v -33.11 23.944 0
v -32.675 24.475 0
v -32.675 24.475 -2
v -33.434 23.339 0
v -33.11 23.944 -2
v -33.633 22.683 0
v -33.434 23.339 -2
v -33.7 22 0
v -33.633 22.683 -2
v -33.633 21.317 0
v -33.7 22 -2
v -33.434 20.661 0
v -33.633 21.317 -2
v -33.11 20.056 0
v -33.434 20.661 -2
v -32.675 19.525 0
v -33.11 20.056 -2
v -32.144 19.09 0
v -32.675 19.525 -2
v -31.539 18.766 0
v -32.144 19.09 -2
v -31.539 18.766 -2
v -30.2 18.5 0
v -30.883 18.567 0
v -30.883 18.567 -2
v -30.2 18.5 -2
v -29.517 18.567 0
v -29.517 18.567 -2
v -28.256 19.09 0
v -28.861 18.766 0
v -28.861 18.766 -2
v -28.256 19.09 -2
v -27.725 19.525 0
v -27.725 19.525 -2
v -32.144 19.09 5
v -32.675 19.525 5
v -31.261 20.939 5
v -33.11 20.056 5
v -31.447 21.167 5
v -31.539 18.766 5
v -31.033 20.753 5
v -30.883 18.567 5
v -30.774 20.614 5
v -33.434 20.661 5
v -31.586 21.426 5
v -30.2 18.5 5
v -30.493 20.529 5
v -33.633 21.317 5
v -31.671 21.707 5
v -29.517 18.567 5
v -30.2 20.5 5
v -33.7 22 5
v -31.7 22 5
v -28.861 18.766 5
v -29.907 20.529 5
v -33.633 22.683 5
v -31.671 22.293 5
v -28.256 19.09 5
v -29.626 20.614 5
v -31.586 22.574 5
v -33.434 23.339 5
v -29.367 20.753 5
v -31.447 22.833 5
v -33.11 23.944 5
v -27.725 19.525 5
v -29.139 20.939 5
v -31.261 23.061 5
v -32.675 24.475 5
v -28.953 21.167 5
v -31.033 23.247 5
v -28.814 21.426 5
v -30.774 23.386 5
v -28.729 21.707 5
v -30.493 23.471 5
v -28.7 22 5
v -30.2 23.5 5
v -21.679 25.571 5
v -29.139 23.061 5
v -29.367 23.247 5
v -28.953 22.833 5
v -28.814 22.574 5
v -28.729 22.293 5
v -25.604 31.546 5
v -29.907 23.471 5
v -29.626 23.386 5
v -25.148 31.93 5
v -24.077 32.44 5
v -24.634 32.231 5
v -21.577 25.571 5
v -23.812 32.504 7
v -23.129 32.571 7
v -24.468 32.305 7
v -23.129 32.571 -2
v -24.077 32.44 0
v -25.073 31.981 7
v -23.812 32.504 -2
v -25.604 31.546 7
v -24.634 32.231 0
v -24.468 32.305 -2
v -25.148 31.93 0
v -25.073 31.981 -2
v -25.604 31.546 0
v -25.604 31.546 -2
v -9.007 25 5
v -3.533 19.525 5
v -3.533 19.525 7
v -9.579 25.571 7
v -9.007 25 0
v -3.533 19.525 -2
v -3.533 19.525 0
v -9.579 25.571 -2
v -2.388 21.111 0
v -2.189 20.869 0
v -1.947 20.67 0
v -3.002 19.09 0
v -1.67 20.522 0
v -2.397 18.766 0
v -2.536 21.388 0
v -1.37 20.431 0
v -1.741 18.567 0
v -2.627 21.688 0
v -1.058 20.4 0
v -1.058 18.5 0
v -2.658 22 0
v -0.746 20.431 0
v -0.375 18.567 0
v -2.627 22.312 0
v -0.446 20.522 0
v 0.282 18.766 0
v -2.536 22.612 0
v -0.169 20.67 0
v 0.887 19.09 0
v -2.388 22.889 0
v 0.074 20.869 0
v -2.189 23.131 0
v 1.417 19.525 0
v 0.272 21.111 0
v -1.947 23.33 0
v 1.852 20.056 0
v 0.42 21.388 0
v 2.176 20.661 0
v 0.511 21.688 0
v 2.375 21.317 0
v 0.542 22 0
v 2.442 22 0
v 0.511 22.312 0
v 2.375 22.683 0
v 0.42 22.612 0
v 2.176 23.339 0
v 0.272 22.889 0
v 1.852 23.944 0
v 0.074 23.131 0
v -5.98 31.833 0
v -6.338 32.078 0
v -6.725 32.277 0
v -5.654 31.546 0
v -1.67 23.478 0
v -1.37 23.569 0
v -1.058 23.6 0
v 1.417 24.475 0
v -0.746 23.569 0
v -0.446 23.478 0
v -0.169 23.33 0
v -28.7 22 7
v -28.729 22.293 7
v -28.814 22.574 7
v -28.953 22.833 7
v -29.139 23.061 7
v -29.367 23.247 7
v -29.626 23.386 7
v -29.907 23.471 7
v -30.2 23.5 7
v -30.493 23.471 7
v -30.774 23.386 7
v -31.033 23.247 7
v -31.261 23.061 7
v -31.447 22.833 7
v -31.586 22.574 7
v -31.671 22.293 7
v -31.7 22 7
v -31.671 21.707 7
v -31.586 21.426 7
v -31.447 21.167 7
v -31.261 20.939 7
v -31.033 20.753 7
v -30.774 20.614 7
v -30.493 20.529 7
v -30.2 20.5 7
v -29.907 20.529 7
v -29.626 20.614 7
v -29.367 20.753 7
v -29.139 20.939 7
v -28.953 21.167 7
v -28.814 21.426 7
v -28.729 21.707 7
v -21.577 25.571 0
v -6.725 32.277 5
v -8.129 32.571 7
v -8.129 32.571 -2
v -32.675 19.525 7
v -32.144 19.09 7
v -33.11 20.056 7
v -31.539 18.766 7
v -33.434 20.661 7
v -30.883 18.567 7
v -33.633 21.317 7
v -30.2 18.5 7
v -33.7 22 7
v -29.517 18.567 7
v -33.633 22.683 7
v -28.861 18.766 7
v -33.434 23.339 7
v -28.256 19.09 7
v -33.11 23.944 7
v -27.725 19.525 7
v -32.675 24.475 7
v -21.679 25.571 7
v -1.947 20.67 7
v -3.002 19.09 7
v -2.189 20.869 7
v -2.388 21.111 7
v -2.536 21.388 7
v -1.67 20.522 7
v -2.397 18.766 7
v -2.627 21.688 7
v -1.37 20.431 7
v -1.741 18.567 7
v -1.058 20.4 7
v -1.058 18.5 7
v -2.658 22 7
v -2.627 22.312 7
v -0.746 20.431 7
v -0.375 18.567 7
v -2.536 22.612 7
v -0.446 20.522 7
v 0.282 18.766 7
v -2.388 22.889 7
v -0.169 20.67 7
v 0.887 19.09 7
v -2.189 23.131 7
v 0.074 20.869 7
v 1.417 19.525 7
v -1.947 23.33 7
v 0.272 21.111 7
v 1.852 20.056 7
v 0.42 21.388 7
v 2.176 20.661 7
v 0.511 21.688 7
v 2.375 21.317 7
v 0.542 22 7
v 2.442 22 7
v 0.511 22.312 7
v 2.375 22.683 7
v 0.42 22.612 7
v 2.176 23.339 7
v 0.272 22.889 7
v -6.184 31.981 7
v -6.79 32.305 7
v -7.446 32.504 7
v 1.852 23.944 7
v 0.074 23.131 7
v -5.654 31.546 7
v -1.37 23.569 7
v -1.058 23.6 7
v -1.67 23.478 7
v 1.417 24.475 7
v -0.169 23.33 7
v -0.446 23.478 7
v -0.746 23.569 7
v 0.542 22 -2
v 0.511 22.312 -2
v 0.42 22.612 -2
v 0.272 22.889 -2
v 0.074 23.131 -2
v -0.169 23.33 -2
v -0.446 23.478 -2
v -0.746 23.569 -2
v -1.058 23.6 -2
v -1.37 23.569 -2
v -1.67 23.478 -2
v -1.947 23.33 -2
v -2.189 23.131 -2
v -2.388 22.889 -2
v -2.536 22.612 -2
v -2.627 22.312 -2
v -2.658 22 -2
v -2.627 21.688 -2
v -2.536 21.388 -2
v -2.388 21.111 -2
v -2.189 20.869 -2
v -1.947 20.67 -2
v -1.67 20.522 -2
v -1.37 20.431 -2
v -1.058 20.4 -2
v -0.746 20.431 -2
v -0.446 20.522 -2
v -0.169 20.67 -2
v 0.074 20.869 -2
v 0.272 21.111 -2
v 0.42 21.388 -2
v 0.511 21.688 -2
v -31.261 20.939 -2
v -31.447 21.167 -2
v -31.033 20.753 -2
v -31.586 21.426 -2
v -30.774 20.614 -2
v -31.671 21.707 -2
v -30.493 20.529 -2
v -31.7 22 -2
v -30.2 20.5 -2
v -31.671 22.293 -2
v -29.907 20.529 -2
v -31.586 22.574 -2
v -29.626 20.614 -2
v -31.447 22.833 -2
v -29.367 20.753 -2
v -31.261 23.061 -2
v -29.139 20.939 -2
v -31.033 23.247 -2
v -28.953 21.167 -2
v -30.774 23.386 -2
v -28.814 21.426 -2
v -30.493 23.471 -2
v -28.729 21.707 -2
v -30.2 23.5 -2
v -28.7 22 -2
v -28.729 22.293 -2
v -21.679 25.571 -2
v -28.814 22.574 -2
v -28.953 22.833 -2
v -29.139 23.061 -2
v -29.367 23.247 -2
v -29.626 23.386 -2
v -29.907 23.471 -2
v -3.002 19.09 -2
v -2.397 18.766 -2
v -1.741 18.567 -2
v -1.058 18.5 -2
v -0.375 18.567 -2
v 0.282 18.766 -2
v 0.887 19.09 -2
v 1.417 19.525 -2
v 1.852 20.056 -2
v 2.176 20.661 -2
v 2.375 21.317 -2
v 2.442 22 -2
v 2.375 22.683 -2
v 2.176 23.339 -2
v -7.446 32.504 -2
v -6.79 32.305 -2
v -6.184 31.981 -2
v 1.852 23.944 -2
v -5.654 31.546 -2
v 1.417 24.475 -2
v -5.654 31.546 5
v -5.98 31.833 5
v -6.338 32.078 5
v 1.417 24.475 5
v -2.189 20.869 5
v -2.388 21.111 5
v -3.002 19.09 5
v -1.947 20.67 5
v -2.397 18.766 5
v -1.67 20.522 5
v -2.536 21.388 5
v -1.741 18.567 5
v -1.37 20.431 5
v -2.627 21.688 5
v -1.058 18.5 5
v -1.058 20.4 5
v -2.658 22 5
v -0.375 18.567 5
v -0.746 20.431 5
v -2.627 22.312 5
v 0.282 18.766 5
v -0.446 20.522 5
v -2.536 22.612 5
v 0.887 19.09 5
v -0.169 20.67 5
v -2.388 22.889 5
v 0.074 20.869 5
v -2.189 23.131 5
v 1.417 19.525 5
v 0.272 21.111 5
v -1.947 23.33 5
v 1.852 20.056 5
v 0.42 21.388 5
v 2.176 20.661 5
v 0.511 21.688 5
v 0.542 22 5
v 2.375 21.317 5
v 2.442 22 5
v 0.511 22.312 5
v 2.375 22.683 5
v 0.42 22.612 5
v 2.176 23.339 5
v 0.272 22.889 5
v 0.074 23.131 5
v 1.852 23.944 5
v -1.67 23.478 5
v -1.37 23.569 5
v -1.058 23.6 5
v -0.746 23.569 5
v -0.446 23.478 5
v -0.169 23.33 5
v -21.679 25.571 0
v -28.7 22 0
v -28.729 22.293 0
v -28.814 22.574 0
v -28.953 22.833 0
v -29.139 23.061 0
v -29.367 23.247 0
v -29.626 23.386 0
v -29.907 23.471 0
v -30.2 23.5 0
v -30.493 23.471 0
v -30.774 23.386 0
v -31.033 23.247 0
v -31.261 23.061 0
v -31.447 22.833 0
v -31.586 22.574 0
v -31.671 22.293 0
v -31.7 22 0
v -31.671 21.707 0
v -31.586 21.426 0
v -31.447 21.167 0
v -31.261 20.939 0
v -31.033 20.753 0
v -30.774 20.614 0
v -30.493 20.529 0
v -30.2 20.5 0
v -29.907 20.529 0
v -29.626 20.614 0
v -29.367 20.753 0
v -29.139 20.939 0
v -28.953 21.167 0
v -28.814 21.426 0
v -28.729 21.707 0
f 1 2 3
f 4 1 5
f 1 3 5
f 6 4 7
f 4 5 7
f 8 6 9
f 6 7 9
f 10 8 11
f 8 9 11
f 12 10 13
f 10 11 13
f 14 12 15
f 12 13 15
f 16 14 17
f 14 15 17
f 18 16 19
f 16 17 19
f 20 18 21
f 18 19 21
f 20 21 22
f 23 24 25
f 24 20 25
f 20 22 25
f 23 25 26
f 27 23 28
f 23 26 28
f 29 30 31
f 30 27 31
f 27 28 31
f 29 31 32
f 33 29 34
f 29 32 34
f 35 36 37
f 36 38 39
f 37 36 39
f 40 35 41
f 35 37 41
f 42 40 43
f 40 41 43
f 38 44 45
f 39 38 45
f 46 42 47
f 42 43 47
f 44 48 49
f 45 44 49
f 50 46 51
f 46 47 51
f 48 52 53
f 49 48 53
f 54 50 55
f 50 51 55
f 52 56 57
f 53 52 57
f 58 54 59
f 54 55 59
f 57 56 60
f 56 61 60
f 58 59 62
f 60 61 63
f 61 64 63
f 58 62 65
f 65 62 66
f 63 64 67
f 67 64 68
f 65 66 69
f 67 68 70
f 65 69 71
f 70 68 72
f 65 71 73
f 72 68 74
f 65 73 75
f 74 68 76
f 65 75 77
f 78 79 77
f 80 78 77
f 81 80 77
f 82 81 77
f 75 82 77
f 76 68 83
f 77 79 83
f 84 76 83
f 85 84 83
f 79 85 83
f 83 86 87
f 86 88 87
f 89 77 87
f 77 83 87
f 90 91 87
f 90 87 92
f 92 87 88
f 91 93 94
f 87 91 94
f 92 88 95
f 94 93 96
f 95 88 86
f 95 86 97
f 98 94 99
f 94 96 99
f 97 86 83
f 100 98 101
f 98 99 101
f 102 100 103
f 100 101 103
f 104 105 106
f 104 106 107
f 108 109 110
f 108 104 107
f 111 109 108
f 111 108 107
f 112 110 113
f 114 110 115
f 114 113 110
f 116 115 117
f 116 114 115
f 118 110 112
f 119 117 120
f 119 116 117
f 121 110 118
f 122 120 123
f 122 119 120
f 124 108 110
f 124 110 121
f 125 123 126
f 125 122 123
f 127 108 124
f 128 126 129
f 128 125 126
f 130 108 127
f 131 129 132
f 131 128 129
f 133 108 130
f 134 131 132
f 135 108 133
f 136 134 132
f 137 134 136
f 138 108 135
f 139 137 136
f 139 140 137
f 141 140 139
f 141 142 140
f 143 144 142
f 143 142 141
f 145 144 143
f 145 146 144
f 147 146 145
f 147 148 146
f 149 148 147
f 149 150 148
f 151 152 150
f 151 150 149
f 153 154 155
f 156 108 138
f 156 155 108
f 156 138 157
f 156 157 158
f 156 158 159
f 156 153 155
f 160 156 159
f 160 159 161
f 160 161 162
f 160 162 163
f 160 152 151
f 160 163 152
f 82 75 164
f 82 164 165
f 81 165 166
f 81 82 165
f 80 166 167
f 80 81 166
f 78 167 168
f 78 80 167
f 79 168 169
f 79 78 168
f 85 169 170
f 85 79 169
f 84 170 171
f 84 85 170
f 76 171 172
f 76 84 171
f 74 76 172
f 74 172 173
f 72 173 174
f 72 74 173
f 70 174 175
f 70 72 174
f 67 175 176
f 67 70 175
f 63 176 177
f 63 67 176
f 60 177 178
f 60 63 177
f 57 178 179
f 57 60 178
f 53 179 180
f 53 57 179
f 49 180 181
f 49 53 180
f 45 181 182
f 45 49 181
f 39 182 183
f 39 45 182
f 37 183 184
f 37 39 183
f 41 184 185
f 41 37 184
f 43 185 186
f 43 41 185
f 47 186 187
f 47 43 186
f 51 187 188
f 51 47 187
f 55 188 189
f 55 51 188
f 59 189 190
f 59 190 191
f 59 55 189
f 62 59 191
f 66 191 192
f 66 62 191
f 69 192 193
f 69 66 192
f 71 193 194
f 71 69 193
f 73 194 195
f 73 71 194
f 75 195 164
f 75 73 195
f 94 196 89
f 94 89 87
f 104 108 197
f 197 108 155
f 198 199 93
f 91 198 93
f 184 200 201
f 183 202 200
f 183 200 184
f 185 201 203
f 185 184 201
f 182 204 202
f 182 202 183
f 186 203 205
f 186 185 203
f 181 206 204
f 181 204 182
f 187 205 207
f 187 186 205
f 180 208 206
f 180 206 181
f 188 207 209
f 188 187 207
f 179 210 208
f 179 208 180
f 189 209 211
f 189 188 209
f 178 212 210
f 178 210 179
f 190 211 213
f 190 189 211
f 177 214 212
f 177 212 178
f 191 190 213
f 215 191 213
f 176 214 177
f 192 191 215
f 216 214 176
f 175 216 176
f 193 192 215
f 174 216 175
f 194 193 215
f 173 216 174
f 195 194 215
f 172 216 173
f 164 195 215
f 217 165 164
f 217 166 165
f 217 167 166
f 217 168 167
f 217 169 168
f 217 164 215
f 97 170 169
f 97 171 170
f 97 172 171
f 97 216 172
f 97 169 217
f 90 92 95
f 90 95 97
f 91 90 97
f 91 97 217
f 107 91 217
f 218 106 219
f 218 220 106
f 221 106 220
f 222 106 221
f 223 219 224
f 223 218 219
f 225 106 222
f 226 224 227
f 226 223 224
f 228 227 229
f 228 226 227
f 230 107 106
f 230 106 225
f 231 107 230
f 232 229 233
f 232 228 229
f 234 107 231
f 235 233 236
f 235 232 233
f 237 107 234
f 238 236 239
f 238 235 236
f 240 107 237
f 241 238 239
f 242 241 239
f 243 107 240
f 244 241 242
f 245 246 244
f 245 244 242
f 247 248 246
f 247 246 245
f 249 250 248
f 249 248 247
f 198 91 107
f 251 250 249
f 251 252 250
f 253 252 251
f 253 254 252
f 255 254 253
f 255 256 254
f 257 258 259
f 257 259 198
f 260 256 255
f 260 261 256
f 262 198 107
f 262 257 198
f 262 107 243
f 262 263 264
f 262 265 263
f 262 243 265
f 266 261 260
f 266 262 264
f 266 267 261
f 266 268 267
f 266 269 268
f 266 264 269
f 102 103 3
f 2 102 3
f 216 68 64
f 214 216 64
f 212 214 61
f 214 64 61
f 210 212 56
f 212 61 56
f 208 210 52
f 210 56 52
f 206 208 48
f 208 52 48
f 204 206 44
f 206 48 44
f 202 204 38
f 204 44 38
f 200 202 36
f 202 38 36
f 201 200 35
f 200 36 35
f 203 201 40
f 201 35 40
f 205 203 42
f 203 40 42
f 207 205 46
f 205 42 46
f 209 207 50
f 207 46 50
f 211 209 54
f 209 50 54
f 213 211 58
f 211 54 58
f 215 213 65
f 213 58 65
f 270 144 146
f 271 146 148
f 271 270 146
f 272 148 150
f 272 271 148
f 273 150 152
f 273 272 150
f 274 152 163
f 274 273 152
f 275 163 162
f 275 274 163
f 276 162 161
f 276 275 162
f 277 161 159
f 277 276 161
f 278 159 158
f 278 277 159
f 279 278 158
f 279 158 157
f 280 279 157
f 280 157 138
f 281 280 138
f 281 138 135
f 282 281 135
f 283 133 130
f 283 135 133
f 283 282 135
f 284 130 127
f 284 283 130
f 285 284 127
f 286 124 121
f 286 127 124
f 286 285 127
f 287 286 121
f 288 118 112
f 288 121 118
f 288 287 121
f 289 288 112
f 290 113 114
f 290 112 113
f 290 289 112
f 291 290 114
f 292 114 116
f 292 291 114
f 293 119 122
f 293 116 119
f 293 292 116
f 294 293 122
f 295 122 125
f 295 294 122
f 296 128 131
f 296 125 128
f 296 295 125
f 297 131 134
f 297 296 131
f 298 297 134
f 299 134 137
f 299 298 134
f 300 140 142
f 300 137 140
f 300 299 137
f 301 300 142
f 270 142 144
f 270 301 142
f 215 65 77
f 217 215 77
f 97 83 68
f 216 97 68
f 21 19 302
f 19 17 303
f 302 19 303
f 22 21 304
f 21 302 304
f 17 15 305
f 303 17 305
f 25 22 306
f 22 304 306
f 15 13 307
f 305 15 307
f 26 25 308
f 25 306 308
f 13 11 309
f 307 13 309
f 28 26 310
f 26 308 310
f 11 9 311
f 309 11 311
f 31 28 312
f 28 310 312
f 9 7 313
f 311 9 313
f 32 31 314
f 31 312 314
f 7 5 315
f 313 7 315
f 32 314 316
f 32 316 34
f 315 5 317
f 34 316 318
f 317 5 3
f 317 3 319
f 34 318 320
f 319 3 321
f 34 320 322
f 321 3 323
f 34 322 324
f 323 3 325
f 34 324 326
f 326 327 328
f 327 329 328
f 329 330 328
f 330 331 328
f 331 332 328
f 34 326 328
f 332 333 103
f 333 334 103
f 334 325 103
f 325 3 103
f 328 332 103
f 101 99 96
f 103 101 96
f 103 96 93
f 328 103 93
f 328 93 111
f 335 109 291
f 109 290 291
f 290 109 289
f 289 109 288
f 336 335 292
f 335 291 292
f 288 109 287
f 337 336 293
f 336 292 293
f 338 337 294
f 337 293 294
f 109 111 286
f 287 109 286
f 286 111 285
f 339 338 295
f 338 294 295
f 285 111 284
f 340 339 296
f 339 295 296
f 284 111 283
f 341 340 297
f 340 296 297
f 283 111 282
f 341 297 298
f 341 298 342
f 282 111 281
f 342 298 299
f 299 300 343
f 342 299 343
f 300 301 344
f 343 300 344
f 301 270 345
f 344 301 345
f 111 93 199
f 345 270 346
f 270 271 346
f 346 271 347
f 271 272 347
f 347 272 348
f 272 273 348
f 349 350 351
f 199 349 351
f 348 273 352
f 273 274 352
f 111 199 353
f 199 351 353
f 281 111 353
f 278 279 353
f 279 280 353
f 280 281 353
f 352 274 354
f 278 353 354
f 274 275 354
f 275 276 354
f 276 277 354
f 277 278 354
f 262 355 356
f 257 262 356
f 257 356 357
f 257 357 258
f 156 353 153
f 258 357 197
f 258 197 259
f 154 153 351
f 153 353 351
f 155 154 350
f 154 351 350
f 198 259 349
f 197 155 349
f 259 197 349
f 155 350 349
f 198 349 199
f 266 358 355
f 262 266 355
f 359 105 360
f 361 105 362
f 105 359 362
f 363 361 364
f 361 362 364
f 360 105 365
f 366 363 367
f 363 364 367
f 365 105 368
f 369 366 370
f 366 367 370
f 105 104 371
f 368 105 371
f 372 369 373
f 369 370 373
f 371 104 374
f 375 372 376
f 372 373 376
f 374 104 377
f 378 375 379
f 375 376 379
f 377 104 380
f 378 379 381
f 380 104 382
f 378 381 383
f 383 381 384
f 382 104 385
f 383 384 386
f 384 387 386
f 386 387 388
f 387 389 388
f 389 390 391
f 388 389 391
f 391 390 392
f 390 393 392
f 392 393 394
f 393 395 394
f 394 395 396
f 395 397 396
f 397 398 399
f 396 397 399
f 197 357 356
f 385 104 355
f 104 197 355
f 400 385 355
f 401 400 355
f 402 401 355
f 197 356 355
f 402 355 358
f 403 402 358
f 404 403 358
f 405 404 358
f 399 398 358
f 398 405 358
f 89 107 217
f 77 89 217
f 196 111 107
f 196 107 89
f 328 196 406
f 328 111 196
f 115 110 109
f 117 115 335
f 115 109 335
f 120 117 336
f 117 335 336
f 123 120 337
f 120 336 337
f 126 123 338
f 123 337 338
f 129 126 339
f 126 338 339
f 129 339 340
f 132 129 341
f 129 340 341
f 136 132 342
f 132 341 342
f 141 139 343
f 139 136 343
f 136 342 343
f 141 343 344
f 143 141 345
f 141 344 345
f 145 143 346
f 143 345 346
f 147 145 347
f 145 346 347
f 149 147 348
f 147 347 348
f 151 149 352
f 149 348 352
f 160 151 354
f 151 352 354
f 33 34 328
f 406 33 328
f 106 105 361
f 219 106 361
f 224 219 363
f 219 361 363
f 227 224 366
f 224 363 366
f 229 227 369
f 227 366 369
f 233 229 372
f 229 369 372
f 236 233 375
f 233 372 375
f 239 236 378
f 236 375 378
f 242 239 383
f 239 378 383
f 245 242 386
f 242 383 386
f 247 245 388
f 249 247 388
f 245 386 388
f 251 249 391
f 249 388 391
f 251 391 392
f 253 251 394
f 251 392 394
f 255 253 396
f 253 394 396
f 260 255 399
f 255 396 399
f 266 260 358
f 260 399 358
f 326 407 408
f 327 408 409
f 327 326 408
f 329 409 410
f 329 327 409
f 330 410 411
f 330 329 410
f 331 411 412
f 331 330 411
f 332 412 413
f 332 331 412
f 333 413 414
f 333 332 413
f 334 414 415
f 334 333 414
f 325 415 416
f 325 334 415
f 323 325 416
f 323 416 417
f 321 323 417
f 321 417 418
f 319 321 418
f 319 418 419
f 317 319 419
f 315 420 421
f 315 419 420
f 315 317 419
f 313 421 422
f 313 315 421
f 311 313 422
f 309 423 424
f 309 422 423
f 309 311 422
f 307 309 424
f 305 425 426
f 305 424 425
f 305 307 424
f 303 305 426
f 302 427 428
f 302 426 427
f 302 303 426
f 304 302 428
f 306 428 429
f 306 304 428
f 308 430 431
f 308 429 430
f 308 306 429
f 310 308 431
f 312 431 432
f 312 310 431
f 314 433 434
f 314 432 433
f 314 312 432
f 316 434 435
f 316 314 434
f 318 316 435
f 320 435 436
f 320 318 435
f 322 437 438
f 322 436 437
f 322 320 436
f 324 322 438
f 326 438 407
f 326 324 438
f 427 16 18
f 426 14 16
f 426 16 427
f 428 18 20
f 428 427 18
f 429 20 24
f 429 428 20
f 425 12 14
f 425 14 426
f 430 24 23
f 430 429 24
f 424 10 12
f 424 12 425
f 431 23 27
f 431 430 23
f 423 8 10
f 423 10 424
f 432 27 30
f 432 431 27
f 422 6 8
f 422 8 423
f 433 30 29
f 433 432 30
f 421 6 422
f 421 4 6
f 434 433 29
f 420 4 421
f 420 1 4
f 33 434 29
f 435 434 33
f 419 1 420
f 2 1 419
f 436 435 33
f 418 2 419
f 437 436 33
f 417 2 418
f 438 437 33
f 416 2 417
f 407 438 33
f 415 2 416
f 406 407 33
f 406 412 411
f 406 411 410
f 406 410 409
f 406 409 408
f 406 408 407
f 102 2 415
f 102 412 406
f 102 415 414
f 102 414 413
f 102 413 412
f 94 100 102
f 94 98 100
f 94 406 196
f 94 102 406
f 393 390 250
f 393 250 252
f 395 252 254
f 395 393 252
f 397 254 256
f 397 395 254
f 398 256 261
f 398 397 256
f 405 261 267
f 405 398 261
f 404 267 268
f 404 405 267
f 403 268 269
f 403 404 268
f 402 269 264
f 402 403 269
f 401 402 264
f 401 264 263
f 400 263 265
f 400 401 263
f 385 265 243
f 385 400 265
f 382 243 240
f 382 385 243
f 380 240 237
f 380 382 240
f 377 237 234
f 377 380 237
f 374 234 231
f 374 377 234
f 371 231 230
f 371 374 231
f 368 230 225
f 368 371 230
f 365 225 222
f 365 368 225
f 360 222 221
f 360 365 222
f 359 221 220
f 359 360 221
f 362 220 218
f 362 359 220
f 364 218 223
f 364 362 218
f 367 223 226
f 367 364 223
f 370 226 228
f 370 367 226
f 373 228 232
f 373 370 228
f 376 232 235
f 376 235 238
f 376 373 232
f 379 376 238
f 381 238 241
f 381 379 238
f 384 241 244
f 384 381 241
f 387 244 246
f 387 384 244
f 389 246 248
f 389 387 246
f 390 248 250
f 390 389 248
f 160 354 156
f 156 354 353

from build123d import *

# Parameters (mm, degrees)
SKETCH003_R       = 1.5
SKETCH003_R_2     = 1.6
PAD003_DEPTH      = 2
PAD003_DEPTH_BACK = 7
POCKET001_DEPTH   = 5
POCKET002_DEPTH   = 5


with BuildPart() as part:
    # Sketch003 → Pad003 (new body, two sides)
    with BuildSketch(Plane.XY) as pad003_sk:
        with BuildLine():
            ThreePointArc((-2.474873, 2.474874), (-2.474874, -2.474873), (2.474873, -2.474874))
            Line((2.474873, -2.474874), (8.520816, 3.571067))
            Line((20.621322, 3.571067), (8.520816, 3.571067))
            Line((26.667265, -2.474874), (20.621322, 3.571067))
            ThreePointArc((26.667265, -2.474874), (31.617012, -2.474873), (31.617011, 2.474874))
            Line((31.617011, 2.474874), (24.545942, 9.545941))
            ThreePointArc((24.545942, 9.545941), (23.410461, 10.304645), (22.071069, 10.571067))
            Line((22.071069, 10.571067), (7.071069, 10.571067))
            ThreePointArc((7.071069, 10.571067), (5.731677, 10.304645), (4.596196, 9.545941))
            Line((4.596196, 9.545941), (-2.474873, 2.474874))
        make_face()
        Circle(SKETCH003_R, mode=Mode.SUBTRACT)
        with Locations((29.142138, 0)):
            Circle(SKETCH003_R_2, mode=Mode.SUBTRACT)
    extrude(amount=-PAD003_DEPTH)
    extrude(pad003_sk.sketch, amount=PAD003_DEPTH_BACK)

    # Sketch006 → Pocket001 (cut)
    with BuildSketch(Plane.XY):
        with BuildLine():
            ThreePointArc((-2.651389, 2.284762), (-2.54902, -2.398437), (2.119285, -2.785432))
            Line((9.024723, 2.468542), (2.119285, -2.785432))
            Line((9.024723, 2.468542), (5.604523, 11.865468))
            Line((5.604523, 11.865468), (-2.651389, 2.284762))
        make_face()
    extrude(amount=POCKET001_DEPTH, mode=Mode.SUBTRACT)

    # Sketch008 → Pocket002 (cut)
    with BuildSketch(Plane(origin=(30, -0.7, 0), x_dir=(1, 0, 0), z_dir=(0, 0, 1))):
        with BuildLine():
            ThreePointArc((-2.085176, -2.811057), (2.596289, -2.347187), (2.587206, 2.357194))
            Line((-6.202528, 12.004617), (2.587206, 2.357194))
            Line((-9.195041, 2.462874), (-6.202528, 12.004617))
            Line((-9.195041, 2.462874), (-2.085176, -2.811057))
        make_face()
    extrude(amount=POCKET002_DEPTH, mode=Mode.SUBTRACT)


with BuildPart() as part_1:
    # Body001 placement: moved
    add(part.part.moved(Location((-30.2, 22, 0))))


solid = part_1.part
